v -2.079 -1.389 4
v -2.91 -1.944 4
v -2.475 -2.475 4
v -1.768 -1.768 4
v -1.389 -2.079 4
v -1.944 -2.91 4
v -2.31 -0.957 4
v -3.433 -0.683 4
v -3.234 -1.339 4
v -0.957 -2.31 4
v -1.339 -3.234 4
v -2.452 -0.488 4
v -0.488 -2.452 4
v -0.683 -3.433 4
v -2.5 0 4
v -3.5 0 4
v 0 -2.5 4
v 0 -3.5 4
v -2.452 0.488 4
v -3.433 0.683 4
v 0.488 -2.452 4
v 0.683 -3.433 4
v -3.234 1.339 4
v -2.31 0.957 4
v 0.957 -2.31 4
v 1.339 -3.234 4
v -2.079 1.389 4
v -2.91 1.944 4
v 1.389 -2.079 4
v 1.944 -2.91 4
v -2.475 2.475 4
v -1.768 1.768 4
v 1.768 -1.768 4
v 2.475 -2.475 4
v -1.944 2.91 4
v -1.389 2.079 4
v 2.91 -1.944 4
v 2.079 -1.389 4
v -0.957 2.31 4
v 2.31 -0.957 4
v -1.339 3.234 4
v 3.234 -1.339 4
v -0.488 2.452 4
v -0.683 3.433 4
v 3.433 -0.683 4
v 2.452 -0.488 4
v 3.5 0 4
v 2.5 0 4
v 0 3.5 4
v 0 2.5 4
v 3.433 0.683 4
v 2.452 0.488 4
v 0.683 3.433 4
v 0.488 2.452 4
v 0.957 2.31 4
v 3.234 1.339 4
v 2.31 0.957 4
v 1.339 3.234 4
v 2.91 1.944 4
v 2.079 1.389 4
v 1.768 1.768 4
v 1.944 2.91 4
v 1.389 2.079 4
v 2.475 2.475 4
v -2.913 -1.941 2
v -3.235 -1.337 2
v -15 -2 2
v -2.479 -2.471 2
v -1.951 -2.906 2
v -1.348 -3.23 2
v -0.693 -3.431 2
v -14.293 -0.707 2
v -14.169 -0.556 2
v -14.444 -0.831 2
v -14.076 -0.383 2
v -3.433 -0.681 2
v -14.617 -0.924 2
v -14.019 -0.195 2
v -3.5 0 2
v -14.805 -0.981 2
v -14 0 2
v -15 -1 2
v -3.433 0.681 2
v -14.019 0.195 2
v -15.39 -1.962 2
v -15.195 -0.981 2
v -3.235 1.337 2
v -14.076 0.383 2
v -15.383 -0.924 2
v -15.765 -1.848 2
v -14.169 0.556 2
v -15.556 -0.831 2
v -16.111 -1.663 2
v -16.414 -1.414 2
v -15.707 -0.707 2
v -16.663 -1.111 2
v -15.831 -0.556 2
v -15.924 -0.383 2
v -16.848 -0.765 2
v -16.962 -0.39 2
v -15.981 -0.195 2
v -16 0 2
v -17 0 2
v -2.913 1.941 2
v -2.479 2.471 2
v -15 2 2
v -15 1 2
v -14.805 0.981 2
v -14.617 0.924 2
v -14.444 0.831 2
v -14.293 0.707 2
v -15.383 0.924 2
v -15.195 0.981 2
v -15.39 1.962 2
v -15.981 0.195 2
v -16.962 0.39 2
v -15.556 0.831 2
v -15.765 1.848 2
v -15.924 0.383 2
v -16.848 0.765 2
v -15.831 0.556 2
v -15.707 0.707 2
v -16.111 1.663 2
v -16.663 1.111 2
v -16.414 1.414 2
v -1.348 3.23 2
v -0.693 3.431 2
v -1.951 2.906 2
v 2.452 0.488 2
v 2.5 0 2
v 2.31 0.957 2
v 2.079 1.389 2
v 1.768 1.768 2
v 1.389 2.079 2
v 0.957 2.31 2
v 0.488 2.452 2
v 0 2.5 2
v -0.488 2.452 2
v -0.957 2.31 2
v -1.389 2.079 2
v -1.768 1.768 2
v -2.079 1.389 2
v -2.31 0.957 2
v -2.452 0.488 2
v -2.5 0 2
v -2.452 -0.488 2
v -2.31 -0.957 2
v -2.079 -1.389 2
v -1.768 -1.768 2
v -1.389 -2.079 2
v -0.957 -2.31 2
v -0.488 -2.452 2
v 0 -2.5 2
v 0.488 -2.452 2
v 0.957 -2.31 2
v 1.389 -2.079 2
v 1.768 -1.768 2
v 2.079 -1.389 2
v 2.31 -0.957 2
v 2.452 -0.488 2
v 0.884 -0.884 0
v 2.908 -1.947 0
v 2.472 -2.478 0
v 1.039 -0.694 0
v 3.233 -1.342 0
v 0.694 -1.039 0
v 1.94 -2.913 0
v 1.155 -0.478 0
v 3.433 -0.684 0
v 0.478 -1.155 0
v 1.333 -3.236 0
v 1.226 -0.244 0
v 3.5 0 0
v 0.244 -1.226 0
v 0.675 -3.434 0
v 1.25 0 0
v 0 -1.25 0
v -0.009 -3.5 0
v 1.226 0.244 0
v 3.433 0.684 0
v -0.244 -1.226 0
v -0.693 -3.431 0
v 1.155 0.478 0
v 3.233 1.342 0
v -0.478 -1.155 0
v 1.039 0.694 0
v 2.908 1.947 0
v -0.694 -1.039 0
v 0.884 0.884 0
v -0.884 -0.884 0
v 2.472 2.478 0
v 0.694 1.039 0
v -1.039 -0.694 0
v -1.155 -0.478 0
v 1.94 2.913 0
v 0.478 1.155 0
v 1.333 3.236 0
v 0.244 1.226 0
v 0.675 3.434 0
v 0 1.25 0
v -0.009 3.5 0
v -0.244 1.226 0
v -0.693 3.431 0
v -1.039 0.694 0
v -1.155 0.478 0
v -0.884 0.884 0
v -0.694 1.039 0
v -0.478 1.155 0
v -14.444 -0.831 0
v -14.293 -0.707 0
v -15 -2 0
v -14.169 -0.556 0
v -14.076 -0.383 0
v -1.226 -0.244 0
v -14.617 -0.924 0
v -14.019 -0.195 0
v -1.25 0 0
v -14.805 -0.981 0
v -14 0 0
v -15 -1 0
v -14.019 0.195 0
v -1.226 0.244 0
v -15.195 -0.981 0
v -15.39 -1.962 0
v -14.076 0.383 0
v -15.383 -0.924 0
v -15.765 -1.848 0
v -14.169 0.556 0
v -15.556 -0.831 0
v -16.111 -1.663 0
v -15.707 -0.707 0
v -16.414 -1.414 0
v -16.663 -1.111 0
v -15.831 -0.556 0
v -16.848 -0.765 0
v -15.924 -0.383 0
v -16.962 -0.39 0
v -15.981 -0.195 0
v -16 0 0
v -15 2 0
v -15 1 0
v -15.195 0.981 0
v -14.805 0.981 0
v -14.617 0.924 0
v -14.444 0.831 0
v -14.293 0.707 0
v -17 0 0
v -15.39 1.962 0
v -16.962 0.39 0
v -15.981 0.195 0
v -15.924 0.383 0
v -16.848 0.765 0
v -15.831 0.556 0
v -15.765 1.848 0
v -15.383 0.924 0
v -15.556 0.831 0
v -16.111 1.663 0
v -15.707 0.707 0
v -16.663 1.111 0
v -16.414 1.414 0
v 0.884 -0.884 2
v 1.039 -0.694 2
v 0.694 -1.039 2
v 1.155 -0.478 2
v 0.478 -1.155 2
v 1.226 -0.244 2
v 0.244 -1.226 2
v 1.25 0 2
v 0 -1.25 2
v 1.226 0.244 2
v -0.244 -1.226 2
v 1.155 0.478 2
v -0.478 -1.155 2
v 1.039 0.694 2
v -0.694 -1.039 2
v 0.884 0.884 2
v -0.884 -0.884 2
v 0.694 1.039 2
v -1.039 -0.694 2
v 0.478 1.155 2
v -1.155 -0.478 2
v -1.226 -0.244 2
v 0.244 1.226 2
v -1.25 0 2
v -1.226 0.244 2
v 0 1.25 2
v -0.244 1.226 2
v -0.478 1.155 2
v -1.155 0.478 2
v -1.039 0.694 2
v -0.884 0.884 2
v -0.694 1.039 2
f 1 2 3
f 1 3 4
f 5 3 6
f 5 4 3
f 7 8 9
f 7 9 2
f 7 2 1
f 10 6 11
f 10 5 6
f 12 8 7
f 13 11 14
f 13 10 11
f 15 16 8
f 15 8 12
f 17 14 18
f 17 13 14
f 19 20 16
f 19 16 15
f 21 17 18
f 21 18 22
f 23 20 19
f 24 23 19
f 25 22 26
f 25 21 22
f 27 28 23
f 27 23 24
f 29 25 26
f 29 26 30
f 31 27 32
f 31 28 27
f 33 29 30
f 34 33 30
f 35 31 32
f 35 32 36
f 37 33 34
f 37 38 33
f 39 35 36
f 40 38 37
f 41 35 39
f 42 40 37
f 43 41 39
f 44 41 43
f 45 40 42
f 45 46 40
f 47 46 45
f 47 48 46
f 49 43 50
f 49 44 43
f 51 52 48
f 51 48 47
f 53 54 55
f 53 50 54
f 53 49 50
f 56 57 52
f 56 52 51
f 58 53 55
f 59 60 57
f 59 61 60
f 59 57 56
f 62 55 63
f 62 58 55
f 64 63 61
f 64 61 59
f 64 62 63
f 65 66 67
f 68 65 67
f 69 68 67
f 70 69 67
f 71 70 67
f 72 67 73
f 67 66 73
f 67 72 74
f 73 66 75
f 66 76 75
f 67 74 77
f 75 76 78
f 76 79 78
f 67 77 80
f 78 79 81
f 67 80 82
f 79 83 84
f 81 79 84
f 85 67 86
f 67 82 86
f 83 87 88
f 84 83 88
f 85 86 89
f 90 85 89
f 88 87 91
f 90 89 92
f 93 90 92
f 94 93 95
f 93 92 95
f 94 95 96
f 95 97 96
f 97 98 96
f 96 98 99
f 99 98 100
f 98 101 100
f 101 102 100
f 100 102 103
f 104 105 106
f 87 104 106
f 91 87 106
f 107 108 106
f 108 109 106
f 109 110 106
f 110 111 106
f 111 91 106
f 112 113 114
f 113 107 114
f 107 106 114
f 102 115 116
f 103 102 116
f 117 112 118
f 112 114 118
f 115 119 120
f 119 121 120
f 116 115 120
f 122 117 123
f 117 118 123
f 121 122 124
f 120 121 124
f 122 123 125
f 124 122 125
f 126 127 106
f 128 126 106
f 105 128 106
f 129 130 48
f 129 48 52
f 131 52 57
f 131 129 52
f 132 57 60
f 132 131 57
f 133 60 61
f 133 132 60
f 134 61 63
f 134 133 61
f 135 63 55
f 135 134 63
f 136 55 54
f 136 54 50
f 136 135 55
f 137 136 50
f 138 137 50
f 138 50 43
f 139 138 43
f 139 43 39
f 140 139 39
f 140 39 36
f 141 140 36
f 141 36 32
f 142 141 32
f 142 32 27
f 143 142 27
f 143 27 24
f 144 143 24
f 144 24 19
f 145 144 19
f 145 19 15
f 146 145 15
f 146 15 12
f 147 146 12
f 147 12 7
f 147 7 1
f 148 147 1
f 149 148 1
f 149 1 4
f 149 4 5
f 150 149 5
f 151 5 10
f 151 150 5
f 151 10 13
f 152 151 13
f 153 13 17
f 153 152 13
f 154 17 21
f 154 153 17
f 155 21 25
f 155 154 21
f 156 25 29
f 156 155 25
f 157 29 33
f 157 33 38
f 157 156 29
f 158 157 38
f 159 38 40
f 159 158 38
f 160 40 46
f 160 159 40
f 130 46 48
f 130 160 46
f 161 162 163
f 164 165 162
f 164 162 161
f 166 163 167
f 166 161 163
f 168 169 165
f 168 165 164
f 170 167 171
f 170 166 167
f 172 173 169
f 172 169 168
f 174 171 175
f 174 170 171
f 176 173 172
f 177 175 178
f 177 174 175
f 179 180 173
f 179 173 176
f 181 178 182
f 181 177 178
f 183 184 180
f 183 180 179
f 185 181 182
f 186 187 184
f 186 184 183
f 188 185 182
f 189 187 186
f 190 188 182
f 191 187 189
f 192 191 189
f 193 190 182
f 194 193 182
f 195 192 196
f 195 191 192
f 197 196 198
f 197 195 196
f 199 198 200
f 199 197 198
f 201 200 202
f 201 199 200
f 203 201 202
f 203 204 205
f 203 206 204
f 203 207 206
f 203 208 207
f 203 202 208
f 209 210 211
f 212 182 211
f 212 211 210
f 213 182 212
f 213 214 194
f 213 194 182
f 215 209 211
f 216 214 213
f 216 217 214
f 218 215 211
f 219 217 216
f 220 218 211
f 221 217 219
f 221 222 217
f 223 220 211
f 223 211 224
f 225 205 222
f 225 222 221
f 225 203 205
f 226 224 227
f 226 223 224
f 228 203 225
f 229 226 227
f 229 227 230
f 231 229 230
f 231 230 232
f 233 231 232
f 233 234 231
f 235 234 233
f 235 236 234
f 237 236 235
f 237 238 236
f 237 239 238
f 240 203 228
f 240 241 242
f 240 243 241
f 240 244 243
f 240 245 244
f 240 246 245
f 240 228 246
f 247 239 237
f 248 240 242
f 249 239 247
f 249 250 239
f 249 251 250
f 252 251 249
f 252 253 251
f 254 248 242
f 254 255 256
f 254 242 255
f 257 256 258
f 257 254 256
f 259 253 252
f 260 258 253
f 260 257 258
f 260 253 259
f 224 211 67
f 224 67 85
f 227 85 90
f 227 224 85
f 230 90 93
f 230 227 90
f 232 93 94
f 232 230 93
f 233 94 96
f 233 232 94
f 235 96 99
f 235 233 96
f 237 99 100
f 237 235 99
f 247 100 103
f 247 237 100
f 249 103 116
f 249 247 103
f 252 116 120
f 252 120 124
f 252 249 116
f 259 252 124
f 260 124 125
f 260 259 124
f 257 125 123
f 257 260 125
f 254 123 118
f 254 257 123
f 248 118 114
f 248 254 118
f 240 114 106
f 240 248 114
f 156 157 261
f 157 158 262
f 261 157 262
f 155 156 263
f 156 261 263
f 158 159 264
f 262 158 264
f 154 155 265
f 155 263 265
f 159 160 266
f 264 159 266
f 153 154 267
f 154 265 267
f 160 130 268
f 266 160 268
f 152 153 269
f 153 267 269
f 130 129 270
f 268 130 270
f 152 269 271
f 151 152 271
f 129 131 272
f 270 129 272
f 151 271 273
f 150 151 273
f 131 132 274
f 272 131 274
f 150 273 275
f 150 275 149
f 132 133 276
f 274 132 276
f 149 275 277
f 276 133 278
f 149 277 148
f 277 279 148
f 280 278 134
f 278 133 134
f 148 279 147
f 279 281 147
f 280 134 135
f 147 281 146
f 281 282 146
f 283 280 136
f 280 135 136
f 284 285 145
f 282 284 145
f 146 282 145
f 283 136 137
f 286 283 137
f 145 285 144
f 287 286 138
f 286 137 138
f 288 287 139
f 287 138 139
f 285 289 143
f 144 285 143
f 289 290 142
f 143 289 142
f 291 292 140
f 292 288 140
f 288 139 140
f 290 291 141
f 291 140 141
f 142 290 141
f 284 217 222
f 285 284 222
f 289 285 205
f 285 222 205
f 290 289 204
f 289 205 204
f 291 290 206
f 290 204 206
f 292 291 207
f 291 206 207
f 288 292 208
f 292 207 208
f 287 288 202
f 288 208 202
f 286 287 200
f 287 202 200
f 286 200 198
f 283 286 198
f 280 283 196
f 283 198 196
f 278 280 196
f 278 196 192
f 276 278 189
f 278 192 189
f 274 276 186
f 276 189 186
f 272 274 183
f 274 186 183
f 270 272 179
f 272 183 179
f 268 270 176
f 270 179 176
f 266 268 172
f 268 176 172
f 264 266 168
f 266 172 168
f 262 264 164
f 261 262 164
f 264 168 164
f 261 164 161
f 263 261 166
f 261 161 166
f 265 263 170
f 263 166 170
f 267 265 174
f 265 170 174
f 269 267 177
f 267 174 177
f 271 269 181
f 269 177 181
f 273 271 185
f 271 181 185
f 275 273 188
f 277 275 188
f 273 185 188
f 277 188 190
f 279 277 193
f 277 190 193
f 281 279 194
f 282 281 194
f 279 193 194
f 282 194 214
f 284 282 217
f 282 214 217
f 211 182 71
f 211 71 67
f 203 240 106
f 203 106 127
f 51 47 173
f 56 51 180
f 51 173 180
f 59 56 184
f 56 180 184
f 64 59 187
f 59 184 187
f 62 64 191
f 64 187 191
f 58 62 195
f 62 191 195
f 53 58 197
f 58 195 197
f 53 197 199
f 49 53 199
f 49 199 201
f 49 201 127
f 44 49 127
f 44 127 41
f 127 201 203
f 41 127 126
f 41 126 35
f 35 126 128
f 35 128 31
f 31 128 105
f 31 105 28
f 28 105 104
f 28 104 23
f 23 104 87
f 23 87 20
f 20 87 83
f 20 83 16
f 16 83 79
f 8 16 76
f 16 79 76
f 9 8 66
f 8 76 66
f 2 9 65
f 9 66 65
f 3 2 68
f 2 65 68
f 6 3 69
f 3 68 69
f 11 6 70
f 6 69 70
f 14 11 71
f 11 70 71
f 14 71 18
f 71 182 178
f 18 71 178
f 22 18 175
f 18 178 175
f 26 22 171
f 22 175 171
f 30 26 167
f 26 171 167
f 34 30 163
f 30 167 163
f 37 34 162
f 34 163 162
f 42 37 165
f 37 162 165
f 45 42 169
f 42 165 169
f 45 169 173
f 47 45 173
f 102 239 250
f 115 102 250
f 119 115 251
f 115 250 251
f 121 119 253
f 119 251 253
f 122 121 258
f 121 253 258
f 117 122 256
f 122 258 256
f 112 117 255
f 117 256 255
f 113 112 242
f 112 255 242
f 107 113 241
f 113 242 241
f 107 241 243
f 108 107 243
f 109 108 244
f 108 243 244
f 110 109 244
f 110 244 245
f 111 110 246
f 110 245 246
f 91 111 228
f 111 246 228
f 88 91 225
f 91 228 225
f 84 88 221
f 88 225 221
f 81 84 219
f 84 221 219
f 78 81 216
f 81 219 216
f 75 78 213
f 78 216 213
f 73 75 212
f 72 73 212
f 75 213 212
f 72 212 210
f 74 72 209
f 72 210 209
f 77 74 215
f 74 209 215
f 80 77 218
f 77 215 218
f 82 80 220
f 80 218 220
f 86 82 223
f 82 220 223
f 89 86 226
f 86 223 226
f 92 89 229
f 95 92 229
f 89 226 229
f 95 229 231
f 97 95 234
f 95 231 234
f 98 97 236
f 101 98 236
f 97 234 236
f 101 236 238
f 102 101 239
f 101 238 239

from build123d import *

# Parameters (mm, degrees)
SKETCH1_R           = 3.5
SKETCH1_R_2         = 2.5
BOSS_EXTRUDE1_DEPTH = 4
SKETCH2_R           = 1
BOSS_EXTRUDE2_DEPTH = 2
SKETCH3_R           = 2.5
SKETCH3_R_2         = 1.25
BOSS_EXTRUDE3_DEPTH = 2


with BuildPart() as part:
    # Sketch1 → Boss-Extrude1 (new body)
    with BuildSketch(Plane.XY):
        Circle(SKETCH1_R)
        Circle(SKETCH1_R_2, mode=Mode.SUBTRACT)
    extrude(amount=BOSS_EXTRUDE1_DEPTH)

    # Sketch2 → Boss-Extrude2 (add)
    with BuildSketch(Plane(origin=(0, 0, 0), x_dir=(-1, 0, 0), z_dir=(0, 0, -1))):
        with BuildLine():
            Line((15, 2), (0.693069307, 3.430693069))
            ThreePointArc((0.693069307, 3.430693069), (2.708850547, 2.216332266), (3.5, 0))
            ThreePointArc((3.5, 0), (2.708850547, -2.216332266), (0.693069307, -3.430693069))
            Line((0.693069307, -3.430693069), (15, -2))
            ThreePointArc((15, -2), (17, 0), (15, 2))
        make_face()
        with Locations((15, 0)):
            Circle(SKETCH2_R, mode=Mode.SUBTRACT)
    extrude(amount=-BOSS_EXTRUDE2_DEPTH)

    # Sketch3 → Boss-Extrude3 (add)
    with BuildSketch(Plane(origin=(0, 0, 0), x_dir=(-1, 0, 0), z_dir=(0, 0, -1))):
        Circle(SKETCH3_R)
        Circle(SKETCH3_R_2, mode=Mode.SUBTRACT)
    extrude(amount=-BOSS_EXTRUDE3_DEPTH)


solid = part.part
